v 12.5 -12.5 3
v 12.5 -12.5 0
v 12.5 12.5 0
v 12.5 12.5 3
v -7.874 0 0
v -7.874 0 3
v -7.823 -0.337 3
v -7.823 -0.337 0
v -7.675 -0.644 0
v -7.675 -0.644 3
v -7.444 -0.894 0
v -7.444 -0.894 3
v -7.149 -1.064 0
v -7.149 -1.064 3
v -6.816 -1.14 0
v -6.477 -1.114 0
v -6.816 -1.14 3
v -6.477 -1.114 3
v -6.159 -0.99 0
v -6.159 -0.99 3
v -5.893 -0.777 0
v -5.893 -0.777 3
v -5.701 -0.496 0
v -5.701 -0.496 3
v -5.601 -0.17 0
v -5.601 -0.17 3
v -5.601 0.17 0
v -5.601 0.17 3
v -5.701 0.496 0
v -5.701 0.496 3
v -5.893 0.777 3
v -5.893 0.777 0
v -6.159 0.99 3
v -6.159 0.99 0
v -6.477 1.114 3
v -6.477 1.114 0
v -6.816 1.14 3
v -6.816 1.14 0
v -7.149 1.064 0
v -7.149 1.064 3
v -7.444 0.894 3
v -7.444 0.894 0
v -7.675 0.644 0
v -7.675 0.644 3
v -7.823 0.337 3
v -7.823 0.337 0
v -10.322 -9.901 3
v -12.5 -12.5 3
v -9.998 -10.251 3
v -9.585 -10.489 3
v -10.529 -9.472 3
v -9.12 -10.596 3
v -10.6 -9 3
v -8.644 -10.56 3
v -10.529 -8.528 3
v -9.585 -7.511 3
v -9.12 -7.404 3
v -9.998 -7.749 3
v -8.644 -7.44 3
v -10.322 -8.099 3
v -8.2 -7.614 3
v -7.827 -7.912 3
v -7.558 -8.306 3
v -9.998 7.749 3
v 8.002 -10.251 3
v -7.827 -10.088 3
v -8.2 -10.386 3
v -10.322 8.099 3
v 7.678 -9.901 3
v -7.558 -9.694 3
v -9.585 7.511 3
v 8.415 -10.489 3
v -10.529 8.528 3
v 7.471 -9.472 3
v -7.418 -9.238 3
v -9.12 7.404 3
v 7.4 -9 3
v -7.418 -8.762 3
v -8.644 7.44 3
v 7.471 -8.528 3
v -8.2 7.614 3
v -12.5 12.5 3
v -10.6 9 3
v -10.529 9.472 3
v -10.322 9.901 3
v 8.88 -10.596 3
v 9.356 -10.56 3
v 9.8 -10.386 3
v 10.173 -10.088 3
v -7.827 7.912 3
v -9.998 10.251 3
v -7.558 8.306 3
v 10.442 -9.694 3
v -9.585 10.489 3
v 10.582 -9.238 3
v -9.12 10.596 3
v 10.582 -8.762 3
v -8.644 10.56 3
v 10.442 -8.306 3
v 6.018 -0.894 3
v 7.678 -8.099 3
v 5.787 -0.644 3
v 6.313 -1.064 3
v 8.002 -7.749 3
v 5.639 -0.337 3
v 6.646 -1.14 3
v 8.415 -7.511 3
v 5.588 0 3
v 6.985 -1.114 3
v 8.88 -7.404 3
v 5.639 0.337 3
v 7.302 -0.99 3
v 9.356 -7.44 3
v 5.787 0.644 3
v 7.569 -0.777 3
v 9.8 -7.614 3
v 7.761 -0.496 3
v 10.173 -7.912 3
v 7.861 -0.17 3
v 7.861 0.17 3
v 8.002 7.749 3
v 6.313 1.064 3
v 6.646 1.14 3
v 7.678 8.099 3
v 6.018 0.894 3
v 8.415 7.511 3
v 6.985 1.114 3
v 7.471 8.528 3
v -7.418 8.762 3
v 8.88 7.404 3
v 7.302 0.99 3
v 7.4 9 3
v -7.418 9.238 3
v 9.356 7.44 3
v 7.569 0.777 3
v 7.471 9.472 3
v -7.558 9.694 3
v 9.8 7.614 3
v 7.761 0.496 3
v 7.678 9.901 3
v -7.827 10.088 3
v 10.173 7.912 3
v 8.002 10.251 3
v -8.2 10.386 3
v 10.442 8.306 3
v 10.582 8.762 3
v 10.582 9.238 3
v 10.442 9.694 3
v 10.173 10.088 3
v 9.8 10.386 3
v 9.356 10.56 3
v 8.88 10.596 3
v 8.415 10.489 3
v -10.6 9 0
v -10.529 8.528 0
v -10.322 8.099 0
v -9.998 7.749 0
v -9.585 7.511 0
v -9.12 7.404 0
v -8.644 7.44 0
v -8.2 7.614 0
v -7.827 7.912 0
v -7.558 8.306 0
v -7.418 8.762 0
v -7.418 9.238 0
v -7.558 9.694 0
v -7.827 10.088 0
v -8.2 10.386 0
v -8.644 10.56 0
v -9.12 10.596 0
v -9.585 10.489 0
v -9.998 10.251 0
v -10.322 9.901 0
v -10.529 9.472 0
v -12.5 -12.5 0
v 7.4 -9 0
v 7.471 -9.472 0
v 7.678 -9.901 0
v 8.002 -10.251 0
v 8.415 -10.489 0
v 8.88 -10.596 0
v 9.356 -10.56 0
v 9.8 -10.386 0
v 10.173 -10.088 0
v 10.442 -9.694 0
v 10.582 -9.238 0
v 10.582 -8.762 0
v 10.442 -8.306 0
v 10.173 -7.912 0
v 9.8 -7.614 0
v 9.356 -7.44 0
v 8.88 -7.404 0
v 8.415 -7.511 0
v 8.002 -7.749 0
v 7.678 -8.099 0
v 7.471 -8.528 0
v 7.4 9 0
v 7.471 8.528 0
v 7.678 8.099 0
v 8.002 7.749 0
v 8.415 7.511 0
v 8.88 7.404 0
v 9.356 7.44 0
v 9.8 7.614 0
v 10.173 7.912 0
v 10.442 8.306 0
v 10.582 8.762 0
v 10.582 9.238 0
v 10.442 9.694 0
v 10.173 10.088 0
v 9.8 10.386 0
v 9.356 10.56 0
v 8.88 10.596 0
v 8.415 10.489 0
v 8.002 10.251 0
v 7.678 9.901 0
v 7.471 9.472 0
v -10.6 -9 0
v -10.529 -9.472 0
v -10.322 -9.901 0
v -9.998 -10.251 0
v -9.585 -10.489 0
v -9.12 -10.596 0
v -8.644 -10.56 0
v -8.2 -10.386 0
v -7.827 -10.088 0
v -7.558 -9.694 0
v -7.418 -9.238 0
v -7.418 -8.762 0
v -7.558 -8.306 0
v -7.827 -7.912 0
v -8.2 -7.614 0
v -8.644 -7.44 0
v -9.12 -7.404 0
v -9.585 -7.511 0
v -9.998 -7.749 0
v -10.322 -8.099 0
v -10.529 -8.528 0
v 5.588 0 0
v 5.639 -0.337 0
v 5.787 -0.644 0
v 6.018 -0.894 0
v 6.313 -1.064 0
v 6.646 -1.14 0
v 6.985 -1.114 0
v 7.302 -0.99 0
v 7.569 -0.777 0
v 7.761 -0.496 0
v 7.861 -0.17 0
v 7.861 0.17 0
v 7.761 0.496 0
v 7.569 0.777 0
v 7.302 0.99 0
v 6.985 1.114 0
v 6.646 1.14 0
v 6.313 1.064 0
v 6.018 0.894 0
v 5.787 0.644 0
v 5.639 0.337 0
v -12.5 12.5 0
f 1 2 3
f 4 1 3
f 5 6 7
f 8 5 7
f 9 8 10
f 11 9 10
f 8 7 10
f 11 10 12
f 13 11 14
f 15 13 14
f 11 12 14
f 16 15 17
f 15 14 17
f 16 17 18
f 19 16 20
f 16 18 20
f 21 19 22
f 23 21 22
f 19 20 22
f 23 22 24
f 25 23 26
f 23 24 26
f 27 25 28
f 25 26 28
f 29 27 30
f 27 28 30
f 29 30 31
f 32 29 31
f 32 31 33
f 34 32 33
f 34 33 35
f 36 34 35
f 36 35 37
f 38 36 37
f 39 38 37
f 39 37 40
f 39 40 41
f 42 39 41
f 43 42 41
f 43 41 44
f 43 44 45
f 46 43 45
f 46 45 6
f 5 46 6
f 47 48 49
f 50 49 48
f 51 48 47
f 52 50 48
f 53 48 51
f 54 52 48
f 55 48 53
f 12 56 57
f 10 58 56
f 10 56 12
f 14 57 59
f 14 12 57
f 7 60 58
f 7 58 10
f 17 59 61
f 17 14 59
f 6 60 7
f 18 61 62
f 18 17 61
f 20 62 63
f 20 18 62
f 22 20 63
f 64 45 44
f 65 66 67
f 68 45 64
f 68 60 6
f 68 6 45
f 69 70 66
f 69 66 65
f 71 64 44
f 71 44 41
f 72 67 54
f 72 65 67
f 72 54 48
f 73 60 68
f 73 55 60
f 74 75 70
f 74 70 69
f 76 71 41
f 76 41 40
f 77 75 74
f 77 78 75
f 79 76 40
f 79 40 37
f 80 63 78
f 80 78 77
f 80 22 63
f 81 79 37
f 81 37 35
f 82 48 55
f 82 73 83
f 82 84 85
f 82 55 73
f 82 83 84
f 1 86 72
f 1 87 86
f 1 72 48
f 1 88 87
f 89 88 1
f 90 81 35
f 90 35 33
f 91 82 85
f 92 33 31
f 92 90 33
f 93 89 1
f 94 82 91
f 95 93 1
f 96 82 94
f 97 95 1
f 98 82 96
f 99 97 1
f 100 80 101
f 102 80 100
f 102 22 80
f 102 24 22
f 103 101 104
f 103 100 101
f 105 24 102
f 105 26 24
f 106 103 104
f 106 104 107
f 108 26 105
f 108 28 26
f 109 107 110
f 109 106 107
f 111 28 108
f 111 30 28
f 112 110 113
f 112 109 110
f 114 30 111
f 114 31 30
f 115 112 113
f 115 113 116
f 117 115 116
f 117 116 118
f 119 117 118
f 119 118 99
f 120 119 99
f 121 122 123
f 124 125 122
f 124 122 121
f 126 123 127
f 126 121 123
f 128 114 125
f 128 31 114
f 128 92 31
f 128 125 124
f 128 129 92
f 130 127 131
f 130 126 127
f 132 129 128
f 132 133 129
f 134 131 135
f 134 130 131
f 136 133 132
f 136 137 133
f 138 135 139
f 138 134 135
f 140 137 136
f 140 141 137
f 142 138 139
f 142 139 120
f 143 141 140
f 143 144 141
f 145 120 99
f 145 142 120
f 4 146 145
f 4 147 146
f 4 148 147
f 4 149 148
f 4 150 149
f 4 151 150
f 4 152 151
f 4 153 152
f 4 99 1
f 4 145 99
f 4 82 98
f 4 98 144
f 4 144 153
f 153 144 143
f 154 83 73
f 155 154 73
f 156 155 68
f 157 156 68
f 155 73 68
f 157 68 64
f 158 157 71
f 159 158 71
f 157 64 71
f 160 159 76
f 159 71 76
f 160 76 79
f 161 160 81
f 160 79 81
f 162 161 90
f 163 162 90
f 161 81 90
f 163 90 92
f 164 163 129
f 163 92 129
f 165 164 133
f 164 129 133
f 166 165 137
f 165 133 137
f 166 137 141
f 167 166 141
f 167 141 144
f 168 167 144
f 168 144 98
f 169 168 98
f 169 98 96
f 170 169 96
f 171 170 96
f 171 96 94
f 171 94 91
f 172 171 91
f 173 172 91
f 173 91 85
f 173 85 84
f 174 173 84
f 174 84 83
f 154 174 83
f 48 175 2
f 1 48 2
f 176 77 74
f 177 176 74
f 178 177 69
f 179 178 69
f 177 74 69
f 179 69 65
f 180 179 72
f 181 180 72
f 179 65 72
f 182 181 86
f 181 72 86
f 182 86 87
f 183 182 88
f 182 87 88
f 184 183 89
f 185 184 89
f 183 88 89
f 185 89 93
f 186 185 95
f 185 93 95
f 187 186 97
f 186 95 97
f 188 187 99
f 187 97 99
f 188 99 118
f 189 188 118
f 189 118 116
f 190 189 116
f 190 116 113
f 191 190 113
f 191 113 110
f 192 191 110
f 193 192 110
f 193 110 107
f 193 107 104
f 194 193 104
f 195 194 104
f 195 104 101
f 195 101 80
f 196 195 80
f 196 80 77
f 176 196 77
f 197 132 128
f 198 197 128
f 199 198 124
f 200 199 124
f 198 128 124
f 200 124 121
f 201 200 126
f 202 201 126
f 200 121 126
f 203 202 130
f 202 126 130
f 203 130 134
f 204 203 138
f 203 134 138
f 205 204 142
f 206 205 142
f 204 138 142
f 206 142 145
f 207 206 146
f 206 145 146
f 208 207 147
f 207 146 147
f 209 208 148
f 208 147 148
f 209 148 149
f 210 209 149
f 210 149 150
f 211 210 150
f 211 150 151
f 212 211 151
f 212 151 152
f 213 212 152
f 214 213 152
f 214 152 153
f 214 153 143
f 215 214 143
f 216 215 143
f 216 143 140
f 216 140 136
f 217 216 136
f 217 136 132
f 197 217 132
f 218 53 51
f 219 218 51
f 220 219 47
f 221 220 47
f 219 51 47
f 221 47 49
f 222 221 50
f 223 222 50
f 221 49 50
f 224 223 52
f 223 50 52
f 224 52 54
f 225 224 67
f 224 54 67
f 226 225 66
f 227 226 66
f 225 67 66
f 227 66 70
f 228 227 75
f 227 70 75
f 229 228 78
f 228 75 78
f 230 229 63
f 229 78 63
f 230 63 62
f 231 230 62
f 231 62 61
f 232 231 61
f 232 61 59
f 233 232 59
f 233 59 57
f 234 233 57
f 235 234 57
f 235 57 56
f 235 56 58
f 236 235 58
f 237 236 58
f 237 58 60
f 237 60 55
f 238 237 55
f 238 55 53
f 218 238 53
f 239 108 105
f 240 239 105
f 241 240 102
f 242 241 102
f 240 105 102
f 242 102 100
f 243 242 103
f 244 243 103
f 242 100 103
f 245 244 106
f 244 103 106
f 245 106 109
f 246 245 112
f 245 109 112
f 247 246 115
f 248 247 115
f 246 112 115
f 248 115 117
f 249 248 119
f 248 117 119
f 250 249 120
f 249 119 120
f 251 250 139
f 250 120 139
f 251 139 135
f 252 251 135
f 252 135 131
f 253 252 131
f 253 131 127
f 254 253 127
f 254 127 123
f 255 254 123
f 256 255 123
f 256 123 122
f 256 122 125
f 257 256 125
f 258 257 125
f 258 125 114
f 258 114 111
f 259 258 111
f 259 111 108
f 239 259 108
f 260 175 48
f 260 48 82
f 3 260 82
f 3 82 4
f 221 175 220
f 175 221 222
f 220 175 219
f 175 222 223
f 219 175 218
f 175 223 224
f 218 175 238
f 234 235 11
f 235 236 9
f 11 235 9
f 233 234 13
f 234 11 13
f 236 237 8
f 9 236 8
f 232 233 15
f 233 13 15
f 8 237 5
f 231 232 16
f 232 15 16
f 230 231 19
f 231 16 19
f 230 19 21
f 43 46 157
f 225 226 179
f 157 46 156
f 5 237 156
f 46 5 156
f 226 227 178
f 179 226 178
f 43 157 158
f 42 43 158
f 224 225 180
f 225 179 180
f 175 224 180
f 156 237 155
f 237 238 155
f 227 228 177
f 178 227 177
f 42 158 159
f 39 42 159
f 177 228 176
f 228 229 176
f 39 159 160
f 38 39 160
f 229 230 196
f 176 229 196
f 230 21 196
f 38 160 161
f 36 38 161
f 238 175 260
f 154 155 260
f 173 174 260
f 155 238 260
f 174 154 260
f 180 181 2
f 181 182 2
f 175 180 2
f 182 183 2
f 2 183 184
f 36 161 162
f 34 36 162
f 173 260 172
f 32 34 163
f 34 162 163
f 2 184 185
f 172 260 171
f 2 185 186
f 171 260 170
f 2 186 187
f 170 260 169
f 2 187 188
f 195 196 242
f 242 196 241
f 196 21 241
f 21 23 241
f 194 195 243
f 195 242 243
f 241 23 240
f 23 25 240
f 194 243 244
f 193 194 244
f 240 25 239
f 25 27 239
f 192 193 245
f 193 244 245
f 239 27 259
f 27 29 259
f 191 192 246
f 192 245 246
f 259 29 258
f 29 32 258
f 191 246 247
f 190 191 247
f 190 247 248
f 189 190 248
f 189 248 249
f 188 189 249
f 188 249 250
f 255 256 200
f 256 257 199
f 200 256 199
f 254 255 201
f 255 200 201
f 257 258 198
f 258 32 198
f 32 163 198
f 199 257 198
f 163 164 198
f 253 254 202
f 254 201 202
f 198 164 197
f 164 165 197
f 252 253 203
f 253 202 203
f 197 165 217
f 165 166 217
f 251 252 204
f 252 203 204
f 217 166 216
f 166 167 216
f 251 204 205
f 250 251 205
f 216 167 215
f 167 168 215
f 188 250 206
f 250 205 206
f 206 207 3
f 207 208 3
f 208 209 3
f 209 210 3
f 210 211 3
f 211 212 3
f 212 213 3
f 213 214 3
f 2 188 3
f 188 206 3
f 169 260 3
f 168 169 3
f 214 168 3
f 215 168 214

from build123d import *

# Parameters (mm, degrees)
F0_W     = 25
F0_H     = 25
F1_DEPTH = 3
F2_D     = 2.286
F3_D     = 3.2


with BuildPart() as f1:
    # F0 (on Top) → F1 (new body)
    with BuildSketch(Plane.XY):
        Rectangle(F0_W, F0_H)
    extrude(amount=F1_DEPTH)

    # F2 (through all)
    with Locations(Plane(origin=(0, 0, 0), x_dir=(1, 0, 0), z_dir=(0, 0, -1))):
        with Locations((-6.731, 0), (6.731, 0)):
            Hole(F2_D / 2)

    # F3 (through all)
    with Locations(Plane(origin=(0, 0, 0), x_dir=(1, 0, 0), z_dir=(0, 0, -1))):
        with Locations((-9, 9), (-9, -9), (9, 9), (9, -9)):
            Hole(F3_D / 2)


solid = f1.part
